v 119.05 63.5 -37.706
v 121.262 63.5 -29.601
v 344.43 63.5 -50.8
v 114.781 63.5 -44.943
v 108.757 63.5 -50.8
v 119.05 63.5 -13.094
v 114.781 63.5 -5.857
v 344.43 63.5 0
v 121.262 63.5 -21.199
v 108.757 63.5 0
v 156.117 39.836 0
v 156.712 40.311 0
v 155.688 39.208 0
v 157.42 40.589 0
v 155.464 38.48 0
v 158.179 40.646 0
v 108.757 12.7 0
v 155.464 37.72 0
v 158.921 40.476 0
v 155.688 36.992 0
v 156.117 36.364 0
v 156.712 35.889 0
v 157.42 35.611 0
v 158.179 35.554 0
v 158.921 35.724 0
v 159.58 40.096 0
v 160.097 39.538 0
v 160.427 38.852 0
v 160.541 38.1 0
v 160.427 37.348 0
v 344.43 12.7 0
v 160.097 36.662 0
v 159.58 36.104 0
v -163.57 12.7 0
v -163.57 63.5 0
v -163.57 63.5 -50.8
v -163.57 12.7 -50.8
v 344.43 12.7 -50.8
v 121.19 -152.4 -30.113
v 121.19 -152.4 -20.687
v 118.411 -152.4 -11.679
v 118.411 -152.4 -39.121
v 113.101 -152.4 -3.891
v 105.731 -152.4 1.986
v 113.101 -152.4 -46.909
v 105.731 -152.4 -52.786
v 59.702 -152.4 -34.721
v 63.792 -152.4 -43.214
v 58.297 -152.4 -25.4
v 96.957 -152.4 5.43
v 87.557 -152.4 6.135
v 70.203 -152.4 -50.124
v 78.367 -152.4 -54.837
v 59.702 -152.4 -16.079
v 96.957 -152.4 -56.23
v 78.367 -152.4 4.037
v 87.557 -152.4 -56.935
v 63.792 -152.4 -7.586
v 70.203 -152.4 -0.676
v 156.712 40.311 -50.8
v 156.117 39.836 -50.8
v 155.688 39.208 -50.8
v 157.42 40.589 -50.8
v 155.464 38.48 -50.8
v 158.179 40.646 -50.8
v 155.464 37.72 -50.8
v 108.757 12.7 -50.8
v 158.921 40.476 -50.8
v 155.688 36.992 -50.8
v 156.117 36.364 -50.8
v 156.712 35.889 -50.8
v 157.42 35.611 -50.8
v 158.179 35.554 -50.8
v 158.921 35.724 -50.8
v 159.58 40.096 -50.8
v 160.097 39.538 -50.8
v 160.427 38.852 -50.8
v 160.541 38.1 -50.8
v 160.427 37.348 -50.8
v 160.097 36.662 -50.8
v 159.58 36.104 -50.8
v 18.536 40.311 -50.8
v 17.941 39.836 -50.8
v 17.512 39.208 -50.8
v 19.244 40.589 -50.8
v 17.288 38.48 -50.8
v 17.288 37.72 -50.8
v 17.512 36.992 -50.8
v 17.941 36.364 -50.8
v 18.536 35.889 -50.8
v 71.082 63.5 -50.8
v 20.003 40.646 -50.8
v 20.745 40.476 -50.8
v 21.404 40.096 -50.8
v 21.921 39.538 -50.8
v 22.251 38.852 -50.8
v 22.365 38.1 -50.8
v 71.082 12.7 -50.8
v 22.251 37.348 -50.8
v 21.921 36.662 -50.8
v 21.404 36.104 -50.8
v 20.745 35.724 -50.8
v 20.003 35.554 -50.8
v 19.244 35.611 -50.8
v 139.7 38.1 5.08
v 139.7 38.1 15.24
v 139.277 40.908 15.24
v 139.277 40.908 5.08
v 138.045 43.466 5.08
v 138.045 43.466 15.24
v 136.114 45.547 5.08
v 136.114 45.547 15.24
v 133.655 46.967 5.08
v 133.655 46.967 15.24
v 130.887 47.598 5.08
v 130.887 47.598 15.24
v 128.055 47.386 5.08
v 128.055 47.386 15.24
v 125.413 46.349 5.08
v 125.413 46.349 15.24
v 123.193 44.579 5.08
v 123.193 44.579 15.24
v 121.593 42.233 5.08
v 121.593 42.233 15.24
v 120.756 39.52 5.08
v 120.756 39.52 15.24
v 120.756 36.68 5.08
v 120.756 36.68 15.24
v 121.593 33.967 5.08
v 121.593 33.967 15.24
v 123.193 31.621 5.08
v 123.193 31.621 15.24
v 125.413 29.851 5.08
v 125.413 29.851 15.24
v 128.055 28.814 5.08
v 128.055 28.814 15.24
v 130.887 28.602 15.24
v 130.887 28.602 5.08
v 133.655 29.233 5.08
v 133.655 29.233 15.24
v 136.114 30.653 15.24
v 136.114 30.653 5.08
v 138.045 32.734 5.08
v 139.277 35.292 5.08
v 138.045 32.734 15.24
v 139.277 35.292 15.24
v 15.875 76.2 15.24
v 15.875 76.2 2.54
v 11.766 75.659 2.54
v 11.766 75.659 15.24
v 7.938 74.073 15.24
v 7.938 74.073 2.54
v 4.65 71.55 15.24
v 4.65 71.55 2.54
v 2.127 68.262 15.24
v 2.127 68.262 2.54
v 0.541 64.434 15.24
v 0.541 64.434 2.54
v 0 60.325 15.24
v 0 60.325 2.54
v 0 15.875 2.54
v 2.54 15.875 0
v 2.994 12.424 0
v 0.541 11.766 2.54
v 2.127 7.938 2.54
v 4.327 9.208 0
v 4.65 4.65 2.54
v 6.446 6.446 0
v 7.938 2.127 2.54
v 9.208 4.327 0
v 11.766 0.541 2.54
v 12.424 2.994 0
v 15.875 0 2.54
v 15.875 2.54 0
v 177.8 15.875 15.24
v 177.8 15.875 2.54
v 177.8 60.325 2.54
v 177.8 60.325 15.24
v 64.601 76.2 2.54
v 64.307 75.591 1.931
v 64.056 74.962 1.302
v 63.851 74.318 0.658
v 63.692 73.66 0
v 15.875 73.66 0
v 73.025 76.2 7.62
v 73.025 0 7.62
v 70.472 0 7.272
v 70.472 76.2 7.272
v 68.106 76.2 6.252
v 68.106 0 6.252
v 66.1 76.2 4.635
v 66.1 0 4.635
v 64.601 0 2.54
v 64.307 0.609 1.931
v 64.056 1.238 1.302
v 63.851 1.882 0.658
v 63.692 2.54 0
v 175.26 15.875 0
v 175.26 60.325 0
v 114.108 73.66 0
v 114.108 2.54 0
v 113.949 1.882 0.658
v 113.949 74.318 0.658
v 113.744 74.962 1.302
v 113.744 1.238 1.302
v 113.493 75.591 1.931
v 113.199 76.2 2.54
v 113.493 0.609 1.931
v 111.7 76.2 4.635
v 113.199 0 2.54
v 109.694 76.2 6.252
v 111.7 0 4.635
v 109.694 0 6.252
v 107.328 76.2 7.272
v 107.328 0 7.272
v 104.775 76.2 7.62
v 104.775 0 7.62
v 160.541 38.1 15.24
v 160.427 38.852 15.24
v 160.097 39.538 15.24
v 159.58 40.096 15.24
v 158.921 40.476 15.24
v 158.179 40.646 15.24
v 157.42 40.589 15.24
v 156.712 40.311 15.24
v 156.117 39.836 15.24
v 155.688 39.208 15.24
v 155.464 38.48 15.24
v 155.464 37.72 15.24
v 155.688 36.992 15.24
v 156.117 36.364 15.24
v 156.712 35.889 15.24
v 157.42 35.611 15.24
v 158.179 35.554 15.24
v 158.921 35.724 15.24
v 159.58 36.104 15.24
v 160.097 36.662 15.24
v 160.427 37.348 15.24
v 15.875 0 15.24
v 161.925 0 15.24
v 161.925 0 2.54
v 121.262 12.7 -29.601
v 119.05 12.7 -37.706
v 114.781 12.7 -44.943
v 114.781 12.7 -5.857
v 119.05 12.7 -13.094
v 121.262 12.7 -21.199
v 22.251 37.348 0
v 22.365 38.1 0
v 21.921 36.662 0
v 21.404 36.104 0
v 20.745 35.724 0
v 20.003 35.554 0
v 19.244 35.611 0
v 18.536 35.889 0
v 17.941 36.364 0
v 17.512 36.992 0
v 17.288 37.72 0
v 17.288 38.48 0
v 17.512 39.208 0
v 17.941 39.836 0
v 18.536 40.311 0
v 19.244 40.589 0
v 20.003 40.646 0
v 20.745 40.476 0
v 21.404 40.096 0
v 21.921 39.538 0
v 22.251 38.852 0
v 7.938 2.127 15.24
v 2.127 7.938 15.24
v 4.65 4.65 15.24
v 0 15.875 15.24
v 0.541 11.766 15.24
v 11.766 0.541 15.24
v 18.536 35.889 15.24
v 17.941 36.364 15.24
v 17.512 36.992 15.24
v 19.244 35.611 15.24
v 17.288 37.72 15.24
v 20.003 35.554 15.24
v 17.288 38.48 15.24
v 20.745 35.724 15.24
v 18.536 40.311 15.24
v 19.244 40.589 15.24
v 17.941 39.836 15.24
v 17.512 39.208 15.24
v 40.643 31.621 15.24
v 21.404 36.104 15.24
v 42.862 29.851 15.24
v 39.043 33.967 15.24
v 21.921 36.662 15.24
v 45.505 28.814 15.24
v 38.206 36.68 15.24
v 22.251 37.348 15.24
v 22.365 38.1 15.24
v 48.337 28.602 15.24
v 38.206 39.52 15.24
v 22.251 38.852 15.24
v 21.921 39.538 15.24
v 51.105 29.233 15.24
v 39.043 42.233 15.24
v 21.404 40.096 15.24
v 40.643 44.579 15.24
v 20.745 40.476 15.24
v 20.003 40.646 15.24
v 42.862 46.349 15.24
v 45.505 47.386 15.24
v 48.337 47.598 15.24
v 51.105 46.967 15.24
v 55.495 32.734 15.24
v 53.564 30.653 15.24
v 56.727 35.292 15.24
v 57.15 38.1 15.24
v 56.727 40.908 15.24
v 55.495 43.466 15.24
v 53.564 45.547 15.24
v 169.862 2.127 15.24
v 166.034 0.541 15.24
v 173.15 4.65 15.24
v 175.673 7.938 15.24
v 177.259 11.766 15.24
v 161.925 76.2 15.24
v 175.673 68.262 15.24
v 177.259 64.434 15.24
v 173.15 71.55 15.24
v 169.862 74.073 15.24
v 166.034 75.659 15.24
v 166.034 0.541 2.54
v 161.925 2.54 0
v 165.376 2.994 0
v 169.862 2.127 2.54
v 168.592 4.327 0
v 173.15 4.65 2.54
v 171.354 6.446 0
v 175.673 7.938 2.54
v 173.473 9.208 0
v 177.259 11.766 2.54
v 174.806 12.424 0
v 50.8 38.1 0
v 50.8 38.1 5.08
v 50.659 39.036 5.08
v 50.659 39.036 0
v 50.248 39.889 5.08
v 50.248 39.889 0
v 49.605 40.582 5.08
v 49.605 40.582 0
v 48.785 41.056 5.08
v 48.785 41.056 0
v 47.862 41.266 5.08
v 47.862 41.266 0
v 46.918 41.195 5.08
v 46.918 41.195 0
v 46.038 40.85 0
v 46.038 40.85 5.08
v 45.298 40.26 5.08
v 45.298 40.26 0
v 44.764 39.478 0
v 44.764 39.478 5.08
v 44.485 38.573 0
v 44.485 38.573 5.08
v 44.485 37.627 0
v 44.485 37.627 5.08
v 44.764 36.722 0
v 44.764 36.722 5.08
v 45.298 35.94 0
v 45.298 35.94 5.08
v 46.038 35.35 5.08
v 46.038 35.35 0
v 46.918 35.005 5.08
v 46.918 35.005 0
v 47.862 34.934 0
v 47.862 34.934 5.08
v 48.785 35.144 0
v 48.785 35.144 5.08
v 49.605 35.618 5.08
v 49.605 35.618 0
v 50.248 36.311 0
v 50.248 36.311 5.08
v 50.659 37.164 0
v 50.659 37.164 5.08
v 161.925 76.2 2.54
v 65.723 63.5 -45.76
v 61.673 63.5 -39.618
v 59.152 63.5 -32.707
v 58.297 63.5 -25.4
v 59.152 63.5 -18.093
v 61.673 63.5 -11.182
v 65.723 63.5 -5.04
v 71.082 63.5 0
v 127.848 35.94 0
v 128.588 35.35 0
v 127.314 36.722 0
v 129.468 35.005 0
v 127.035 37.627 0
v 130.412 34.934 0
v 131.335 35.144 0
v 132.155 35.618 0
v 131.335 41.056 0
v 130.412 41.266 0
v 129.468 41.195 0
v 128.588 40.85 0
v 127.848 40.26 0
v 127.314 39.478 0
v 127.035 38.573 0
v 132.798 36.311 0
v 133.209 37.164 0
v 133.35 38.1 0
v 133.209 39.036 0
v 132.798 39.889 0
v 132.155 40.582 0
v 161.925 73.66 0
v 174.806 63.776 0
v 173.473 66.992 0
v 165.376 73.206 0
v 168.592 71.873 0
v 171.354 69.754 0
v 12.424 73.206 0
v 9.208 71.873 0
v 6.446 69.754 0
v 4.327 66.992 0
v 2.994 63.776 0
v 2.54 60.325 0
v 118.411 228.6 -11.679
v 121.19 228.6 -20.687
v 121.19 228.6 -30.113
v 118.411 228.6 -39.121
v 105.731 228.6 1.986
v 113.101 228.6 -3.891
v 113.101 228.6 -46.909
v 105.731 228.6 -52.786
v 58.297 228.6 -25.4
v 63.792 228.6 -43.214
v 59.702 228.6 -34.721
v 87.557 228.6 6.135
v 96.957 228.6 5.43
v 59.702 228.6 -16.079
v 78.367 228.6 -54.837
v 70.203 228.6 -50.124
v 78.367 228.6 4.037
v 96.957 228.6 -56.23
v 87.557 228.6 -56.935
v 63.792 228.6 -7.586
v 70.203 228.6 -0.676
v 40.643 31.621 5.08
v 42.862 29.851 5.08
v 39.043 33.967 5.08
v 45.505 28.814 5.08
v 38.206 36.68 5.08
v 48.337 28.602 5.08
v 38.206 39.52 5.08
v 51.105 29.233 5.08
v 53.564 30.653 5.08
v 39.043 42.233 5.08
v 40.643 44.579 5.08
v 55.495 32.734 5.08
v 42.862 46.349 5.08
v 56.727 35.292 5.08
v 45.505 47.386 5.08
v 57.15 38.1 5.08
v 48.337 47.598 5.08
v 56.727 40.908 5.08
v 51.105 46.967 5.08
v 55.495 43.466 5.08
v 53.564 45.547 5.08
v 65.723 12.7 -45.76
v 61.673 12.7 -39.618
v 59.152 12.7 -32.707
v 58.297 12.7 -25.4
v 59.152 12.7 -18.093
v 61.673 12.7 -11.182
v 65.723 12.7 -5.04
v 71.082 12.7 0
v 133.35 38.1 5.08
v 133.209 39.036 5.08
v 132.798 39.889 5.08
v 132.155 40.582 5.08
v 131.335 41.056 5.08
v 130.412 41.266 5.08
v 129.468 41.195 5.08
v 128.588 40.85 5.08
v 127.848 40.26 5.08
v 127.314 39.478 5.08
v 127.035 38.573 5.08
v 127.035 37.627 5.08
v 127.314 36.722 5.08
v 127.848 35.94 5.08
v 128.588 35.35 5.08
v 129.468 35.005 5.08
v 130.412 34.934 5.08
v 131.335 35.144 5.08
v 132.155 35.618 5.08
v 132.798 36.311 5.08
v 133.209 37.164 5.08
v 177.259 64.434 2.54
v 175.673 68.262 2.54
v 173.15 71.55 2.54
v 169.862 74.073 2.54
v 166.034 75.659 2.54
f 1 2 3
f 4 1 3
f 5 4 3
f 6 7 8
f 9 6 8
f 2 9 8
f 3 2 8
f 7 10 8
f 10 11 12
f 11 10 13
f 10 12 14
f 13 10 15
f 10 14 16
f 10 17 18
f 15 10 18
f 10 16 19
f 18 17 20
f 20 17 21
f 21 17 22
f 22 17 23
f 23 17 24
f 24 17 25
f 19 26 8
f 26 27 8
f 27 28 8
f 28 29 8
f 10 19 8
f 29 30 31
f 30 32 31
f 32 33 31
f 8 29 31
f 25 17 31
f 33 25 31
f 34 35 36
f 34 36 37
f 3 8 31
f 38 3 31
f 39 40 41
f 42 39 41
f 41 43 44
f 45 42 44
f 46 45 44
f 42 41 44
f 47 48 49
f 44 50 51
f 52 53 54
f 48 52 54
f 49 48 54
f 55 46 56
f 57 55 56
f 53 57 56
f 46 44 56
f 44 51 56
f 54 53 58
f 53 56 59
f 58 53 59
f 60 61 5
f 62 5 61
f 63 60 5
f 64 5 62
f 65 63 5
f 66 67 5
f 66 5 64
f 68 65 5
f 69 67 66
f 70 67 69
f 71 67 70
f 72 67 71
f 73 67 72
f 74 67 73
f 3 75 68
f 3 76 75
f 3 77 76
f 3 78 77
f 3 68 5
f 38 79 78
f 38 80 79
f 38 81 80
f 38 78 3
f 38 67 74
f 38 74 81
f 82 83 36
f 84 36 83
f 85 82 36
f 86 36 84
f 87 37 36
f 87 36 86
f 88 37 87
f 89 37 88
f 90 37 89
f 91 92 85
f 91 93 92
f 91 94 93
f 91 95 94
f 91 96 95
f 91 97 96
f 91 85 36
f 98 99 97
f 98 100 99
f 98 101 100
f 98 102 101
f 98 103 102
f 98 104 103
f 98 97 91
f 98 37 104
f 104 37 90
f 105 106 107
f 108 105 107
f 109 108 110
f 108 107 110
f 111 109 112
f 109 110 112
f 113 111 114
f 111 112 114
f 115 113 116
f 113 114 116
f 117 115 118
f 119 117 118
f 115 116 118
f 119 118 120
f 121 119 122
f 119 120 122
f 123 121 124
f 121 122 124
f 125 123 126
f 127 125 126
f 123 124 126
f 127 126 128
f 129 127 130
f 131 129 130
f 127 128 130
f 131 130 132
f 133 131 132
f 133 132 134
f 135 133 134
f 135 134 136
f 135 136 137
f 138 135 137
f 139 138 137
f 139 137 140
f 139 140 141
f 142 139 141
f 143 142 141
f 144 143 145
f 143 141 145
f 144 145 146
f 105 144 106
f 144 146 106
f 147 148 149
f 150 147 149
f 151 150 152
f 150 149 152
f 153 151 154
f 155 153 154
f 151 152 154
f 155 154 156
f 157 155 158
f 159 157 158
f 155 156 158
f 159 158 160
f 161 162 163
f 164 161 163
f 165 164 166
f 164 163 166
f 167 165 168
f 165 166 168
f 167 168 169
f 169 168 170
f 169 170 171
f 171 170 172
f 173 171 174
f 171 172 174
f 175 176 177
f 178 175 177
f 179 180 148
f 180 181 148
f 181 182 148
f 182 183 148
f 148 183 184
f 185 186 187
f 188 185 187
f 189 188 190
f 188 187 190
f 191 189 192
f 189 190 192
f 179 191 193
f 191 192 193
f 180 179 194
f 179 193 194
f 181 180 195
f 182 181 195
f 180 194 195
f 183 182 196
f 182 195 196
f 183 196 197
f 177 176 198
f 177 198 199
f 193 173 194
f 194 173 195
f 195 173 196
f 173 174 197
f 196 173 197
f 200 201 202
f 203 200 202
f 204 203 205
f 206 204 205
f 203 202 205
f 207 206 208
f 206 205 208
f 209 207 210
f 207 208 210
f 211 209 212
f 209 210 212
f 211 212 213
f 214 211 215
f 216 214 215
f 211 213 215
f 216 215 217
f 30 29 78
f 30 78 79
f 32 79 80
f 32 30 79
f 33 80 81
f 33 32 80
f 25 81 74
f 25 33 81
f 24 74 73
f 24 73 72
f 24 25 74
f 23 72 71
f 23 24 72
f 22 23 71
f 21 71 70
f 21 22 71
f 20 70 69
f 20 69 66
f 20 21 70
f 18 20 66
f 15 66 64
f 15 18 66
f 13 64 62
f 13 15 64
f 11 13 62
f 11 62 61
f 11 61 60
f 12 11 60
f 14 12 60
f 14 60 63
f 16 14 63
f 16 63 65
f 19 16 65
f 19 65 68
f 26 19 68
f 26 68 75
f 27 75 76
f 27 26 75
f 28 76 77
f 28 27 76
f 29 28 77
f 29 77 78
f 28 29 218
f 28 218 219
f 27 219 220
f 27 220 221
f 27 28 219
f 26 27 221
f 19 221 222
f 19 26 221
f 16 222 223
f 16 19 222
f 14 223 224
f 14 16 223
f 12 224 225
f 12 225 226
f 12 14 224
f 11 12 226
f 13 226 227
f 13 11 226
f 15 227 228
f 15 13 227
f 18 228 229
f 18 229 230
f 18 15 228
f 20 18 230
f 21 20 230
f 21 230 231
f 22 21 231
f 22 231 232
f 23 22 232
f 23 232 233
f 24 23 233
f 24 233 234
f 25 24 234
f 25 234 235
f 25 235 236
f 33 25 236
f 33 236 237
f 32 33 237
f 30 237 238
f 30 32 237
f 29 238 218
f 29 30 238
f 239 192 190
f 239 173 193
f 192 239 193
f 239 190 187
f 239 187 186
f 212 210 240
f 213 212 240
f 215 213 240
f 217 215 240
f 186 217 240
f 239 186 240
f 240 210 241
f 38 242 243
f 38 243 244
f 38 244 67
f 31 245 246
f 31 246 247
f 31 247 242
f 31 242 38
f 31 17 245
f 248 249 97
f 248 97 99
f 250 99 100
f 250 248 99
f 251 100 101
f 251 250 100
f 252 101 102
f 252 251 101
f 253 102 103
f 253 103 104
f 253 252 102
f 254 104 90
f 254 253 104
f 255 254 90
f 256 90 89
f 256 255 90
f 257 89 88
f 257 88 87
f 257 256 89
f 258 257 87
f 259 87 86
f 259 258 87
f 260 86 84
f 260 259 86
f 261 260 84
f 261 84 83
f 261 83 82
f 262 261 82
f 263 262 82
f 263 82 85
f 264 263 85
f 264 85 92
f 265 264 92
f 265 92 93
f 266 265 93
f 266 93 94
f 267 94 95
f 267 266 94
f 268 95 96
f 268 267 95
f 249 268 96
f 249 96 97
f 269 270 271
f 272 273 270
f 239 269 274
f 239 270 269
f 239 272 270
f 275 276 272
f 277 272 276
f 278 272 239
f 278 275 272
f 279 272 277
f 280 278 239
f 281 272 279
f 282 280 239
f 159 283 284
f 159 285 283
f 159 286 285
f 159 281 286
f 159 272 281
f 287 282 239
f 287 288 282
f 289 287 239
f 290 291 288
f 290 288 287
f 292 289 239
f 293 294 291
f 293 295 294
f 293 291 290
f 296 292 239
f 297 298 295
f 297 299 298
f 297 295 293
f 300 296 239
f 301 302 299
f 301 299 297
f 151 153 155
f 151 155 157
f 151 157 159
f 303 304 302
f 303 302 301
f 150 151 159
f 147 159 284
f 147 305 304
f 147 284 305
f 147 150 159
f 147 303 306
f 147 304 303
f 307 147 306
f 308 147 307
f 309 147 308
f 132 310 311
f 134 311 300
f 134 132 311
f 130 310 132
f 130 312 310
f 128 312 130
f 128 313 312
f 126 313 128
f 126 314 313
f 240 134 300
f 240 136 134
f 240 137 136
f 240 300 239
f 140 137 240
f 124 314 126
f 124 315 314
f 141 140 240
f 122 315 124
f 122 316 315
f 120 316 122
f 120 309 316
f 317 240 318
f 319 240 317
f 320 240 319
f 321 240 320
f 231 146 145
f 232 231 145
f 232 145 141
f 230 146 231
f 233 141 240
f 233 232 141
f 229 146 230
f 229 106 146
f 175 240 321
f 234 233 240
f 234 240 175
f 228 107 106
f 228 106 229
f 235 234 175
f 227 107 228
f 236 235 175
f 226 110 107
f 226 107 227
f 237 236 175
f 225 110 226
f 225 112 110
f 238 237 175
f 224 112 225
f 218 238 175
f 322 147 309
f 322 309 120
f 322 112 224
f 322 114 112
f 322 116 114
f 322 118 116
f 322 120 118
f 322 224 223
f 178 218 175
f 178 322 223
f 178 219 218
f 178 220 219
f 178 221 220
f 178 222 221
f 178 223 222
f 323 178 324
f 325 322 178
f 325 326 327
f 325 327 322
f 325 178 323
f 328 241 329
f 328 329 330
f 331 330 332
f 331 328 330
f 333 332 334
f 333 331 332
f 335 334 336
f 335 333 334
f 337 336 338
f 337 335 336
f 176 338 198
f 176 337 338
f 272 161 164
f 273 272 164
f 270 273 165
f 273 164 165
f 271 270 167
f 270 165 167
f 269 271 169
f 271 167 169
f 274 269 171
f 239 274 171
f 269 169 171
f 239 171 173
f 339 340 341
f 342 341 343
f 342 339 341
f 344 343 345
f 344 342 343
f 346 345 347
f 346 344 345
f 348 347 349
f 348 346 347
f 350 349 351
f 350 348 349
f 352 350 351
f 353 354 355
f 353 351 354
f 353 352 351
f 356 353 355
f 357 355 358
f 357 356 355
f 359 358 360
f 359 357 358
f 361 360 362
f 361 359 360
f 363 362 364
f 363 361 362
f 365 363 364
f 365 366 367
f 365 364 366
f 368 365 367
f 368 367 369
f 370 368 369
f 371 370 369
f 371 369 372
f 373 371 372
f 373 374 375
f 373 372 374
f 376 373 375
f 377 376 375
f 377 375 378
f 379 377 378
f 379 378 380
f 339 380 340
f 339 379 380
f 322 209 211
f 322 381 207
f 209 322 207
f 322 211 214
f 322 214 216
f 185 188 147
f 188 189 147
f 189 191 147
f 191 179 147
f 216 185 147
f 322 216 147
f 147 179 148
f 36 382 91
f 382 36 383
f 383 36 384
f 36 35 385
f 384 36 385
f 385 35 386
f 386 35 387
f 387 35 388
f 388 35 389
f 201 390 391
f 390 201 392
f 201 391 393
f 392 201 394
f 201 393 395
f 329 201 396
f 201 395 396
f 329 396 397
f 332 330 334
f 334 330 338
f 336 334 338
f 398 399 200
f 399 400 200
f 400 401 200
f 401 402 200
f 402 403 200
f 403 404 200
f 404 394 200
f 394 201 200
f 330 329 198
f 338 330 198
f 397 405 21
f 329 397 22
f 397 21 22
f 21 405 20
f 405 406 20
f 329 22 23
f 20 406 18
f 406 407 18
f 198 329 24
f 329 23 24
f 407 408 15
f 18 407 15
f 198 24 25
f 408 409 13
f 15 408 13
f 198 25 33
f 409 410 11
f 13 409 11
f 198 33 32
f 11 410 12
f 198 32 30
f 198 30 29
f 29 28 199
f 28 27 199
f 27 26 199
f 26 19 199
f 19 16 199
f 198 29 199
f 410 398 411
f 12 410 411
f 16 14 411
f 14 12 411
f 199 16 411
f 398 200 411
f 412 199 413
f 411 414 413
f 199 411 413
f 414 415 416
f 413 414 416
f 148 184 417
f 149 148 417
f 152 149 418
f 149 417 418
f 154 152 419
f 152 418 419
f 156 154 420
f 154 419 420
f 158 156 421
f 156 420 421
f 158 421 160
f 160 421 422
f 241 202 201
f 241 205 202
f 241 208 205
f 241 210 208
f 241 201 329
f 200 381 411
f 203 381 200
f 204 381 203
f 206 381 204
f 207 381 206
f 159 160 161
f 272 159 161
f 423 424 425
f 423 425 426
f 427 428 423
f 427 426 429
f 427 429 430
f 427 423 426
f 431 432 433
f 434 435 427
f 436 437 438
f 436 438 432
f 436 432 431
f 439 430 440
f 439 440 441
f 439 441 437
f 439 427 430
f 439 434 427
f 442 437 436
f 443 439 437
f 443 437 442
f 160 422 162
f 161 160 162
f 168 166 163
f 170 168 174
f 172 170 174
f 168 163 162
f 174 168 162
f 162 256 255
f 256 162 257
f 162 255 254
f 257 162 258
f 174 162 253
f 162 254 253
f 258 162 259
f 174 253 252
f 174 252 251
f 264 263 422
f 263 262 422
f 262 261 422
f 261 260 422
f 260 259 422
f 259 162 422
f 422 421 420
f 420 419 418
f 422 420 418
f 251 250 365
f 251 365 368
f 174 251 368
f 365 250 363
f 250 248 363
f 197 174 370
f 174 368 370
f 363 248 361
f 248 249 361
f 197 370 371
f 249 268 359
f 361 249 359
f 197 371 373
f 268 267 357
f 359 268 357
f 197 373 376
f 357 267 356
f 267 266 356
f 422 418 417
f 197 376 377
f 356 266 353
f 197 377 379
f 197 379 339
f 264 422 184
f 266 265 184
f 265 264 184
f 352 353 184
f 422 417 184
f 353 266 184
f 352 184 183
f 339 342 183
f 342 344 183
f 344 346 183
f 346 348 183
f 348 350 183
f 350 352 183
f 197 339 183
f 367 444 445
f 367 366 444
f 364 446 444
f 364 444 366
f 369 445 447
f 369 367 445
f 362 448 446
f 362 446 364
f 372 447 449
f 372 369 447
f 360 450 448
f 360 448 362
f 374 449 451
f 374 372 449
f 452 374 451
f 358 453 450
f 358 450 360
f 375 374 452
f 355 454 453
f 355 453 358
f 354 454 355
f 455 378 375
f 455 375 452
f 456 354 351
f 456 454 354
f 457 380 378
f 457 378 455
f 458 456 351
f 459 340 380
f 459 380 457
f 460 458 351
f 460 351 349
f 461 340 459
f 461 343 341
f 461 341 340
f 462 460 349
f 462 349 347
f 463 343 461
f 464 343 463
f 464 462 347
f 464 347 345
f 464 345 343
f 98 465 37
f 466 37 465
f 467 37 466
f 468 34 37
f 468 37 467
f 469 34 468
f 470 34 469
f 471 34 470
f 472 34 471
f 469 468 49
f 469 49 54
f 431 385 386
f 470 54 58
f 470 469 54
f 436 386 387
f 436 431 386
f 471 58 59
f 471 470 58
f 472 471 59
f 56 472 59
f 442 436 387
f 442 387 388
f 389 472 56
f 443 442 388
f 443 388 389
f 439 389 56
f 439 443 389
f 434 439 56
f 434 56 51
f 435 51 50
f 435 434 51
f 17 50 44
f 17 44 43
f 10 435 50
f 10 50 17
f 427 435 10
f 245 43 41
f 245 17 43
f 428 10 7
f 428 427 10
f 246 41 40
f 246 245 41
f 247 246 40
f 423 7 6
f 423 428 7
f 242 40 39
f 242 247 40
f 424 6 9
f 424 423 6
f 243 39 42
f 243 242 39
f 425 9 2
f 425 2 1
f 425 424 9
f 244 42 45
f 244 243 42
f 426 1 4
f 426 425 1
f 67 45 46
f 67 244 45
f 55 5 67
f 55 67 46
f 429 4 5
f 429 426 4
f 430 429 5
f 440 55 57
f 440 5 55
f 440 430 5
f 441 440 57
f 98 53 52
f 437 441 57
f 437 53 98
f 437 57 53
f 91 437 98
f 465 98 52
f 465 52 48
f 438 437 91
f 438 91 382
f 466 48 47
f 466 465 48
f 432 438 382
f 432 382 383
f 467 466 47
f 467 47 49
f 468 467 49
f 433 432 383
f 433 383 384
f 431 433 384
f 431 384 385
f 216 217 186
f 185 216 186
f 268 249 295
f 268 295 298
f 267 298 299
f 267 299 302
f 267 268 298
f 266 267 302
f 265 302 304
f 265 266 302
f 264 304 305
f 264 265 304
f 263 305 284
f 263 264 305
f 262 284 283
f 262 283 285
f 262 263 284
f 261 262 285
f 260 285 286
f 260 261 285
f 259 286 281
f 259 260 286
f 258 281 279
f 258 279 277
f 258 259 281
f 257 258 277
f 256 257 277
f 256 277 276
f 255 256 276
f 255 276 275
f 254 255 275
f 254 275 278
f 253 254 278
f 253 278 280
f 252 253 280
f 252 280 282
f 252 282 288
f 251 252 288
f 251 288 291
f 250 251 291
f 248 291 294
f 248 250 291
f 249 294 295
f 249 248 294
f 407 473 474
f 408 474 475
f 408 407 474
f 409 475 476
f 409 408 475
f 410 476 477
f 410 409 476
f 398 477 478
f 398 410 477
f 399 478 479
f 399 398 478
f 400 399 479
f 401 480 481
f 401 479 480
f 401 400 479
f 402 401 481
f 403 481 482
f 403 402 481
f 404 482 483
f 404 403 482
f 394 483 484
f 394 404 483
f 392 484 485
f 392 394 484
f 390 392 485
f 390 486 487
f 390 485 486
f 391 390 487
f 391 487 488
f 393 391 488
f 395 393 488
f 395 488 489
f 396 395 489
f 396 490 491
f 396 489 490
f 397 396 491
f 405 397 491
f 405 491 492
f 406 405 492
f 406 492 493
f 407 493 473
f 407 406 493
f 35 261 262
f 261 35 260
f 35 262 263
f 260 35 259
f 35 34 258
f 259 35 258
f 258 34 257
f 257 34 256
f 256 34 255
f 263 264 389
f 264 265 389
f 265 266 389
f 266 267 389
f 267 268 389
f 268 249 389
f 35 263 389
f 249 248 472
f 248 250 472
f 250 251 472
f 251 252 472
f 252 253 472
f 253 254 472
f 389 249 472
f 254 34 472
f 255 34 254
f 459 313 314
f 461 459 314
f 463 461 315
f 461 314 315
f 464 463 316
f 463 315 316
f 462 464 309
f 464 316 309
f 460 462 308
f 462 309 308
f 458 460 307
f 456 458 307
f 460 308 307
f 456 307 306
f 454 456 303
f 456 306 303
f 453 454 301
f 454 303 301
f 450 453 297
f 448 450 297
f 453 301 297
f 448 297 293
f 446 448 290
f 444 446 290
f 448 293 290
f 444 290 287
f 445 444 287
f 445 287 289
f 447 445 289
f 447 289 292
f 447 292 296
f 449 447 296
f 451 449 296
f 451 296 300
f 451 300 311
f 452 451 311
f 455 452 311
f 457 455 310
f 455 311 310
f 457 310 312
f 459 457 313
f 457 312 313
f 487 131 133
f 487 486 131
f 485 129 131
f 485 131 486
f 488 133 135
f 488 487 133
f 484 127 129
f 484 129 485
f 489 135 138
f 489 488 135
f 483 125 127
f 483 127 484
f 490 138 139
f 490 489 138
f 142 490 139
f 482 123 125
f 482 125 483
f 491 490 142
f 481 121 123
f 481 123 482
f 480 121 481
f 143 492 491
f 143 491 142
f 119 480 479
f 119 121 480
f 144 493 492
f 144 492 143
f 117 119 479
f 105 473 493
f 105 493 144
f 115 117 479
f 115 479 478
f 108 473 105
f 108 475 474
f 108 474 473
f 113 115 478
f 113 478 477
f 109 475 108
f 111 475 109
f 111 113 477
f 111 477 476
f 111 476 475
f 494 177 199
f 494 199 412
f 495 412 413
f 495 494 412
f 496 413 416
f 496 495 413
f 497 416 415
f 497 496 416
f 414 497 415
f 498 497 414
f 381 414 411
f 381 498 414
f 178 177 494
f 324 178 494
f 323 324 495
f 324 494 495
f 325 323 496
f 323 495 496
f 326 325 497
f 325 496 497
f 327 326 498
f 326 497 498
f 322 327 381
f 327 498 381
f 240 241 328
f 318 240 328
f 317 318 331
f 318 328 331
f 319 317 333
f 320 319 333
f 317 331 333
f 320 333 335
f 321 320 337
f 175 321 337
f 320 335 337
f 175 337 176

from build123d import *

# Parameters (mm, degrees)
F0_R      = 2.5527
F0_R_2    = 3.175
F1_DEPTH  = 15.24
F3_DEPTH  = 76.201
F4_SIZE   = 2.54
F5_W      = 508
F5_H      = 50.8
F5_R      = 2.5527
F6_DEPTH  = 50.8
F8_R      = 31.623
F9_DEPTH  = 190.5
F10_R     = 9.525
F11_DEPTH = 10.16


with BuildPart() as f1:
    # F0 (on Top) → F1 (new body)
    with BuildSketch(Plane.XY):
        with BuildLine():
            ThreePointArc((0, 15.875), (4.6496798487, 4.6496798487), (15.875, 0))
            Line((15.875, 0), (161.925, 0))
            ThreePointArc((161.925, 0), (173.1503201513, 4.6496798487), (177.8, 15.875))
            Line((177.8, 15.875), (177.8, 60.325))
            ThreePointArc((177.8, 60.325), (173.1503201513, 71.5503201513), (161.925, 76.2))
            Line((161.925, 76.2), (15.875, 76.2))
            ThreePointArc((15.875, 76.2), (4.6496798487, 71.5503201513), (0, 60.325))
            Line((0, 60.325), (0, 15.875))
        make_face()
        with Locations((19.812, 38.1)):
            Circle(F0_R, mode=Mode.SUBTRACT)
        with Locations((47.625, 38.1)):
            Circle(F0_R_2, mode=Mode.SUBTRACT)
        with Locations((130.175, 38.1)):
            Circle(F0_R_2, mode=Mode.SUBTRACT)
        with Locations((157.988, 38.1)):
            Circle(F0_R, mode=Mode.SUBTRACT)
    extrude(amount=F1_DEPTH)

    # F2 (on face) → F3 (cut, through all)
    with BuildSketch(Plane.XZ):
        with BuildLine():
            Line((104.775, 7.62), (73.025, 7.62))
            ThreePointArc((73.025, 7.62), (66.2898079092, 4.8301920908), (63.5, -1.905))
            Line((63.5, -1.905), (63.5, -16.0088390112))
            Line((63.5, -16.0088390112), (114.3, -16.0088390112))
            Line((114.3, -16.0088390112), (114.3, -1.905))
            ThreePointArc((114.3, -1.905), (111.5101920908, 4.8301920908), (104.775, 7.62))
        make_face()
    extrude(amount=-F3_DEPTH, mode=Mode.SUBTRACT)

    # F4
    f4_edges = [f1.edges().sort_by_distance(p)[0] for p in [
        (39.783722, 0, 0),
        (4.64968, 4.64968, 0),
        (0, 38.1, 0),
        (4.64968, 71.55032, 0),
        (39.783722, 76.2, 0),
        (138.016278, 76.2, 0),
        (173.15032, 71.55032, 0),
        (177.8, 38.1, 0),
        (173.15032, 4.64968, 0),
        (138.016278, 0, 0),
    ]]
    chamfer(f4_edges, length=F4_SIZE)

    # F10 (on face) → F11 (cut)
    with BuildSketch(Plane.XY.offset(15.24)):
        with Locations((130.175, 38.1)):
            Circle(F10_R)
        with Locations((47.625, 38.1)):
            Circle(F10_R)
    extrude(amount=-F11_DEPTH, mode=Mode.SUBTRACT)


with BuildPart() as f6:
    # F5 (on face) → F6 (new body)
    with BuildSketch(Plane(origin=(0, 0, 0), x_dir=(1, 0, 0), z_dir=(0, 0, -1))):
        with Locations((90.429624754, -38.1)):
            Rectangle(F5_W, F5_H)
        with Locations((19.812, -38.1)):
            Circle(F5_R, mode=Mode.SUBTRACT)
        with Locations((157.988, -38.1)):
            Circle(F5_R, mode=Mode.SUBTRACT)
    extrude(amount=F6_DEPTH)

    # F8 (on offset) → F9 (join, symmetric)
    with BuildSketch(Plane(origin=(0, 38.1, 0), x_dir=(-1, 0, 0), z_dir=(0, 1, 0))):
        with Locations((-89.919749836, -25.4)):
            Circle(F8_R)
    extrude(amount=F9_DEPTH, both=True)


solid = Compound([f1.part, f6.part])
